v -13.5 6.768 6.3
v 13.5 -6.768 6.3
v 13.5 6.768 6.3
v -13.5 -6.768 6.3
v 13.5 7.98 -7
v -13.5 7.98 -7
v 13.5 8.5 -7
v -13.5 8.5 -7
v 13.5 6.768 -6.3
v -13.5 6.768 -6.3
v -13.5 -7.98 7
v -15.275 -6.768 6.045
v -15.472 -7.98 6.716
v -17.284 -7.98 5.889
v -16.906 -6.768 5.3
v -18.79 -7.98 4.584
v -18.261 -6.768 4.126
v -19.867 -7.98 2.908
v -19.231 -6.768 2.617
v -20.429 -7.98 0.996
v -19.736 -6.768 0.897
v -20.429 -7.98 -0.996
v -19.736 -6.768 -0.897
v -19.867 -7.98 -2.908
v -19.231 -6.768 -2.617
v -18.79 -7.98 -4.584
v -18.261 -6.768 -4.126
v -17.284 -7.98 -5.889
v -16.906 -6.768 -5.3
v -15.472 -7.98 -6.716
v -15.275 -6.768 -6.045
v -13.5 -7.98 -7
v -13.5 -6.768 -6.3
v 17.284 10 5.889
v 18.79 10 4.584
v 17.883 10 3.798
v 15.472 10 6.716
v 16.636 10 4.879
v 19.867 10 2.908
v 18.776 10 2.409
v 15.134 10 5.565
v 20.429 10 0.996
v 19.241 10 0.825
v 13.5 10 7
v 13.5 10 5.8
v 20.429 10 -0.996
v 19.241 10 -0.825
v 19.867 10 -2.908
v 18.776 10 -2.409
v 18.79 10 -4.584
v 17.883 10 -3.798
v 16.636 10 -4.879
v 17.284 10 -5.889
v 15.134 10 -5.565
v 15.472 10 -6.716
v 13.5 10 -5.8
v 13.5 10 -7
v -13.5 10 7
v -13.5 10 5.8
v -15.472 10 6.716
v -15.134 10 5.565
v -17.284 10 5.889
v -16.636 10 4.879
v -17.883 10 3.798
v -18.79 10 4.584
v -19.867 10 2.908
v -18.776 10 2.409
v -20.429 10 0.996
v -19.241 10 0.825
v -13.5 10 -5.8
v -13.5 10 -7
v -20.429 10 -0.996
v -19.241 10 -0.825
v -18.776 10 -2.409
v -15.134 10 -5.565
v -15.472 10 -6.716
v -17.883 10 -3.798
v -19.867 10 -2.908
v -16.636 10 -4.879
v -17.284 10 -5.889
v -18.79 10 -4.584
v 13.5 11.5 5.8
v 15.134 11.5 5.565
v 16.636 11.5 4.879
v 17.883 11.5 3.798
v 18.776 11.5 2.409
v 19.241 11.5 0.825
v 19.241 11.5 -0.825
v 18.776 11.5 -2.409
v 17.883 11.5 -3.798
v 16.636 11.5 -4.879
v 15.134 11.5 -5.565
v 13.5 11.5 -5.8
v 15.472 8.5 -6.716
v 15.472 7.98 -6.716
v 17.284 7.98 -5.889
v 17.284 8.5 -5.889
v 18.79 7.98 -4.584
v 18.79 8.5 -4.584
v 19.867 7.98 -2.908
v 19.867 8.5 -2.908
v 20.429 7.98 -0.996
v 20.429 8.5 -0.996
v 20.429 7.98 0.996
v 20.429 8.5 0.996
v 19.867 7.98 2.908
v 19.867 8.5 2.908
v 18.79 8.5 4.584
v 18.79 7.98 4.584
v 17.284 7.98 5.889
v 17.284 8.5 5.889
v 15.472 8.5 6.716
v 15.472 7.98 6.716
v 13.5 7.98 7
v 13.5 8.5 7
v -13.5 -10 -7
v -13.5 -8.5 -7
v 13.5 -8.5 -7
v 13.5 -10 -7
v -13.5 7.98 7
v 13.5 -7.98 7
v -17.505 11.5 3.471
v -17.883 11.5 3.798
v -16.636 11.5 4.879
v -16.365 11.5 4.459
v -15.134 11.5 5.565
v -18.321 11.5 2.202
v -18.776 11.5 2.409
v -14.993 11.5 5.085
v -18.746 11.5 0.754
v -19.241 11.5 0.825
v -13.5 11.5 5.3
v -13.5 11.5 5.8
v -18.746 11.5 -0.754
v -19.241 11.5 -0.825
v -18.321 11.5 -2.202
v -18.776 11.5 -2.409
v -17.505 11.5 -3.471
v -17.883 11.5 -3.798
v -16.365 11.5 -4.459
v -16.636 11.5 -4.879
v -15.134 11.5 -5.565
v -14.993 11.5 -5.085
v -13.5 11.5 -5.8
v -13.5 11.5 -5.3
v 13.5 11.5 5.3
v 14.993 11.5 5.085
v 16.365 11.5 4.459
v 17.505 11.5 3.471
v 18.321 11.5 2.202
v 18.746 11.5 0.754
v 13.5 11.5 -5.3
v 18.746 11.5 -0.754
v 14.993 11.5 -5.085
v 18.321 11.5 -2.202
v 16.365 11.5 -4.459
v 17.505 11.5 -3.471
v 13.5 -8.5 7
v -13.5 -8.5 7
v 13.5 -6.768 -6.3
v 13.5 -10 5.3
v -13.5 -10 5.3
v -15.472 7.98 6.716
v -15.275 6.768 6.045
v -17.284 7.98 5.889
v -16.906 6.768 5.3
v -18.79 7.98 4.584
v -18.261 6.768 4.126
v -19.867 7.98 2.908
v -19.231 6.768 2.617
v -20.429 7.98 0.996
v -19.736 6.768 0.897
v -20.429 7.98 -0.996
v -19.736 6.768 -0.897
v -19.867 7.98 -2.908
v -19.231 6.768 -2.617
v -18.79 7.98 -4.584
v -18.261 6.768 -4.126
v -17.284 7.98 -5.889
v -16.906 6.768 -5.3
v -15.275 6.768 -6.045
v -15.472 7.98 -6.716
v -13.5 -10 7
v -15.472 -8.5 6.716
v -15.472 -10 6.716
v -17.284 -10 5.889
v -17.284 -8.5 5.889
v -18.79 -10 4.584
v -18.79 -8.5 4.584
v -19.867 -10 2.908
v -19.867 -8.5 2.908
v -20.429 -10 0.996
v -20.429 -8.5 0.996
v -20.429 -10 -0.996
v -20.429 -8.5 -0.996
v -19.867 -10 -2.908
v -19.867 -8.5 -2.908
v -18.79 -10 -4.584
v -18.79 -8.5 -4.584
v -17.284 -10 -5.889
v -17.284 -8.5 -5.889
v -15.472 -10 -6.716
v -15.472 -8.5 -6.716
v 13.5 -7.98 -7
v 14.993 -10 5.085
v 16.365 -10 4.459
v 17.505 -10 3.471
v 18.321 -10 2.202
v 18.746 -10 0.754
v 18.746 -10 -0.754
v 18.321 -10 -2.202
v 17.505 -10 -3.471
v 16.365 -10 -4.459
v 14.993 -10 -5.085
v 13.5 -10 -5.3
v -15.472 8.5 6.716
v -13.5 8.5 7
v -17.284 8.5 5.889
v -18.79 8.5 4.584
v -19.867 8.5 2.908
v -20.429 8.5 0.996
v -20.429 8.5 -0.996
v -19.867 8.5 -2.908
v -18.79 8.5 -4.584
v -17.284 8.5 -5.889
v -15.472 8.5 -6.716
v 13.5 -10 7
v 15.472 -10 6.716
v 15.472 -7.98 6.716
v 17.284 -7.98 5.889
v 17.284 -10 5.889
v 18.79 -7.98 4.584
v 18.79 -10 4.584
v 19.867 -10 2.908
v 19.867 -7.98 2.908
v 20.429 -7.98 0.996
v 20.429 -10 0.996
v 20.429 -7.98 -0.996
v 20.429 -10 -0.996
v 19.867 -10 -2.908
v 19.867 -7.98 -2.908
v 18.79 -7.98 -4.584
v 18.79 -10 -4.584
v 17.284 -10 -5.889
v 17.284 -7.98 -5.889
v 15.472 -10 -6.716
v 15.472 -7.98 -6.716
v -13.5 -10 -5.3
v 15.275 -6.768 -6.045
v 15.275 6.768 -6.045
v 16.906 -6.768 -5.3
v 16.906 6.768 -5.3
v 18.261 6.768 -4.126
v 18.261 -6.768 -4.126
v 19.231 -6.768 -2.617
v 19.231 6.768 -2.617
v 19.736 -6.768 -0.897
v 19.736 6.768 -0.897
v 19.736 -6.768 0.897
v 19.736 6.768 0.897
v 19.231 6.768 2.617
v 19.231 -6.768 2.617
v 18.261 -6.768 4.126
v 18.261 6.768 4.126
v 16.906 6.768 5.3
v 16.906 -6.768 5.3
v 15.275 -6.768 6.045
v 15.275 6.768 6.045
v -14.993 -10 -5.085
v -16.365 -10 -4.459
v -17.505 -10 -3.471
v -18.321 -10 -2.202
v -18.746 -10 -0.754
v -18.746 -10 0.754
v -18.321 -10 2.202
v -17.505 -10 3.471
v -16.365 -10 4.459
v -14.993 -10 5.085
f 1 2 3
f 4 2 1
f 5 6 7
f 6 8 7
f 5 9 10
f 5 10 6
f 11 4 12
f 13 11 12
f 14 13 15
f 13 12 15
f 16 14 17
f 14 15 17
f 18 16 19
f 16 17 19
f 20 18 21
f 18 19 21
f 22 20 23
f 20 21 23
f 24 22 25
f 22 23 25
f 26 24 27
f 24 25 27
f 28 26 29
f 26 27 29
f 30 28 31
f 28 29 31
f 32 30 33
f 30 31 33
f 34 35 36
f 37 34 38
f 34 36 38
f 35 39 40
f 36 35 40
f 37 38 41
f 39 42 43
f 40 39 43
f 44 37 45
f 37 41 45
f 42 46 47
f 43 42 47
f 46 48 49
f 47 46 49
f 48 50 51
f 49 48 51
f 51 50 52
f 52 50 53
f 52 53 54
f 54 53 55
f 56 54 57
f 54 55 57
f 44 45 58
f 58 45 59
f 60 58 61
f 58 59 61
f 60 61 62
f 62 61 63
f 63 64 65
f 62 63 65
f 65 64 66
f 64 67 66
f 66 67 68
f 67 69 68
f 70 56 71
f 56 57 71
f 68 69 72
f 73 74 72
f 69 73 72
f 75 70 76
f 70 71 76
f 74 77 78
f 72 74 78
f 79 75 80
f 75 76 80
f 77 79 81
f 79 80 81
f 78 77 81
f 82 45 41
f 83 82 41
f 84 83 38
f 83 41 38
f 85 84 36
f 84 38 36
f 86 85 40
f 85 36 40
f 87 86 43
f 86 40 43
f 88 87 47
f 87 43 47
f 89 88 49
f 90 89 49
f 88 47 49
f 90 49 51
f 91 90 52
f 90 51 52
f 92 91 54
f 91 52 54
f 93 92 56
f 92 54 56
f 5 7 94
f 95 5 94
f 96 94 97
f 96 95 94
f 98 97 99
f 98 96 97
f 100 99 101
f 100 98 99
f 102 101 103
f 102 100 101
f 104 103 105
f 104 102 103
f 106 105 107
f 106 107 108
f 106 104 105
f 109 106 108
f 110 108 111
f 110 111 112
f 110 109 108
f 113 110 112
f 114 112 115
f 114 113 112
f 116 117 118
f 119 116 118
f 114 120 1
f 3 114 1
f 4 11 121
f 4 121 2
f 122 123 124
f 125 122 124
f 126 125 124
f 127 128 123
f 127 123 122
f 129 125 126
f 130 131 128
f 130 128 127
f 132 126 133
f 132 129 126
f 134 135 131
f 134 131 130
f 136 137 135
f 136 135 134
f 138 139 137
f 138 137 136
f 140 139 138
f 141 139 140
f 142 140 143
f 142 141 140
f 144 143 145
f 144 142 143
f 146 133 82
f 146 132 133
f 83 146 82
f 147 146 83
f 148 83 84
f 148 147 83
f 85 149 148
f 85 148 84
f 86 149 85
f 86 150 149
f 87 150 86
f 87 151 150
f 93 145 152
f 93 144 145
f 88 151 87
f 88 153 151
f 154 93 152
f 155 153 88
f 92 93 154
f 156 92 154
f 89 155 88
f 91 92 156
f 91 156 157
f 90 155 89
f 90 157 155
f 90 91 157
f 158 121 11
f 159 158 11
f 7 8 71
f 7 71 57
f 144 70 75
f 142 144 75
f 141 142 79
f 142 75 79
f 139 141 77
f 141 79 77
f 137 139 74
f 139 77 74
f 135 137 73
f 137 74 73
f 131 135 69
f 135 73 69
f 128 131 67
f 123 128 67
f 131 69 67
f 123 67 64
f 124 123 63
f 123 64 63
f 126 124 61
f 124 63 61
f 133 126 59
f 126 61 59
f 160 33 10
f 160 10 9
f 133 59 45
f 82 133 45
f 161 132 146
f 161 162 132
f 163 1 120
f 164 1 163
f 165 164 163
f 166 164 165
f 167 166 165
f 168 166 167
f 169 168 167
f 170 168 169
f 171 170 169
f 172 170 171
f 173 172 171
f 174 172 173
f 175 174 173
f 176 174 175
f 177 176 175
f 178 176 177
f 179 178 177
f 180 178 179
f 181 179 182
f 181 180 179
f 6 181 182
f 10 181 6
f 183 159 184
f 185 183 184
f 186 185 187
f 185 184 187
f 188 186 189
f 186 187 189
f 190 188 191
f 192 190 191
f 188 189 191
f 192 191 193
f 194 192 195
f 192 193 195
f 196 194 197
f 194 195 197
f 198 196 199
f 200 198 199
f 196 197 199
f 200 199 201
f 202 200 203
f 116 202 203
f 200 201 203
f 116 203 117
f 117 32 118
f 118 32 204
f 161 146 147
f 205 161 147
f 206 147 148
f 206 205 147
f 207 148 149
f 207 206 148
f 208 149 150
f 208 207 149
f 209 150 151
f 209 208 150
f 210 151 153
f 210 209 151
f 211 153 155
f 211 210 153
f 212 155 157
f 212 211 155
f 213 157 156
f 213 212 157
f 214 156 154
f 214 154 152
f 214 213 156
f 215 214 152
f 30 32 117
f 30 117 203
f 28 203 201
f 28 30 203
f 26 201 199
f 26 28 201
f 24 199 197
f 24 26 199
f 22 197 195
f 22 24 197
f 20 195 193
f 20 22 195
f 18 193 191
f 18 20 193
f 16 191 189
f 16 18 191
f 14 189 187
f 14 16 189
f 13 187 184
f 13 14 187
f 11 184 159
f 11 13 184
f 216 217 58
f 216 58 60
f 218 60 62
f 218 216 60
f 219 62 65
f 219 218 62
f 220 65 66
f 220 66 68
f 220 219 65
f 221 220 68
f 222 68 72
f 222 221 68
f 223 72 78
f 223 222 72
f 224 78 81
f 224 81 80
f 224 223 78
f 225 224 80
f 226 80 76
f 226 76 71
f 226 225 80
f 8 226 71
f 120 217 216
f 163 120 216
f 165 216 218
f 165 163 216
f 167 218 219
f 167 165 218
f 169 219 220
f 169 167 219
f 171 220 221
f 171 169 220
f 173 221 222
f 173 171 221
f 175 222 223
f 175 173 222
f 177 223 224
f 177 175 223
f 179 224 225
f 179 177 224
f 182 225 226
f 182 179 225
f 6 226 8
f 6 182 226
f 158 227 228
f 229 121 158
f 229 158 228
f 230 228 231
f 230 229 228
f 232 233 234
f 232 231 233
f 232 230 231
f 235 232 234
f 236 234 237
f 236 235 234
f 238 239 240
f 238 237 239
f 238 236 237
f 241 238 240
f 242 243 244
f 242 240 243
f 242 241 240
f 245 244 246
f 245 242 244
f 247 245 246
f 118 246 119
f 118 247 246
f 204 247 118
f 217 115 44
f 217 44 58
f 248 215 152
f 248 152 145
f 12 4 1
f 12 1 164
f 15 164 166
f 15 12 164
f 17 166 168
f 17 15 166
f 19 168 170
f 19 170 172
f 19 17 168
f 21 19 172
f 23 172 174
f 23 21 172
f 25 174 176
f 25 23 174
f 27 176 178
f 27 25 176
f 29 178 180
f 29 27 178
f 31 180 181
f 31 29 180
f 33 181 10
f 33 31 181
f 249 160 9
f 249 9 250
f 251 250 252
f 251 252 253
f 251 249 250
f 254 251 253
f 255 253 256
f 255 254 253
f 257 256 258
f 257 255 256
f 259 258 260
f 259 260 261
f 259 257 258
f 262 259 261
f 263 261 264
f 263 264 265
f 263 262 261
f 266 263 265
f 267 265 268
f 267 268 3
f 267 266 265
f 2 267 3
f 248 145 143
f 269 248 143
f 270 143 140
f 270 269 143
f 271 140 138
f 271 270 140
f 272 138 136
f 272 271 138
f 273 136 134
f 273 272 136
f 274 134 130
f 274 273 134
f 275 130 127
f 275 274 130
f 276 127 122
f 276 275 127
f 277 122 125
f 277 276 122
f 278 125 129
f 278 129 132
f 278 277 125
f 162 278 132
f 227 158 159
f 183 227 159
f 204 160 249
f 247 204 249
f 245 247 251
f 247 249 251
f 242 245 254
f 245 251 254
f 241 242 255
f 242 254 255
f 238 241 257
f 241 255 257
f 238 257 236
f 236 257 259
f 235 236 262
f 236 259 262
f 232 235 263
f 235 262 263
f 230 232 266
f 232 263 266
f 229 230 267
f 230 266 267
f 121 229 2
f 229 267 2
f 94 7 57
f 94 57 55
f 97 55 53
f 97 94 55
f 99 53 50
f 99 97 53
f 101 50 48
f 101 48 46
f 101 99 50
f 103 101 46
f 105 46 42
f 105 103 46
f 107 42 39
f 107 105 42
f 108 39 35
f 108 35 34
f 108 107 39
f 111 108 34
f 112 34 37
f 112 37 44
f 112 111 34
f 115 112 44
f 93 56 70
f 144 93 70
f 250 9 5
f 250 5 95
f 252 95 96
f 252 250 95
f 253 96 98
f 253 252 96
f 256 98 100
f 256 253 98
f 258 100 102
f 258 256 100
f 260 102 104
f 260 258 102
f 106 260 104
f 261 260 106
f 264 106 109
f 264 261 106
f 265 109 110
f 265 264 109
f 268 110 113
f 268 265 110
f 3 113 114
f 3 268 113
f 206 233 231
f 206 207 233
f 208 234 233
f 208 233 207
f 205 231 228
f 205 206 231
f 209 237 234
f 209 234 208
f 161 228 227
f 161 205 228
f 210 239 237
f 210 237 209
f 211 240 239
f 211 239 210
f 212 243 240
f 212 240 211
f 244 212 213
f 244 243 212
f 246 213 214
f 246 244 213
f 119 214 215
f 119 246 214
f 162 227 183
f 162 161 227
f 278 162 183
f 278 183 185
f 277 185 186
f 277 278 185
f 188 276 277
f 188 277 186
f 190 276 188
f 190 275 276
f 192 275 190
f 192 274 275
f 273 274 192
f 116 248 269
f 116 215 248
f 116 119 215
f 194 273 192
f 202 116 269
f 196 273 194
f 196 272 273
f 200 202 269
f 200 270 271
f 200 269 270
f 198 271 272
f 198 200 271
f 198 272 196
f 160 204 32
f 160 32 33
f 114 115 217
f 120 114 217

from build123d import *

# Parameters (mm, degrees)
BOSS_EXTRUDE1_DEPTH      = 10
BOSS_EXTRUDE1_DEPTH_BACK = 10
BOSS_EXTRUDE2_START      = -1.5
BOSS_EXTRUDE2_DEPTH      = 1.5
BOSS_EXTRUDE3_DEPTH      = 1.5
CHAMFER1_SIZE            = 1
CHAMFER1_SIZE_2          = 1.732050808


with BuildPart() as part:
    # Sketch1 → Boss-Extrude1 (new, two sides: drawn at the far end of the back side and taken through both)
    with BuildSketch(Plane(origin=(0, 0, 0), x_dir=(1, 0, 0), z_dir=(0, 1, 0)).offset(-BOSS_EXTRUDE1_DEPTH_BACK)):
        with BuildLine():
            Line((-13.5, 6.3), (13.5, 6.3))
            ThreePointArc((13.5, 6.3), (19.8, 0), (13.5, -6.3))
            Line((13.5, -6.3), (-13.5, -6.3))
            ThreePointArc((-13.5, -6.3), (-19.8, 0), (-13.5, 6.3))
        make_face()
        with BuildLine():
            Line((-13.5, 5.3), (13.5, 5.3))
            ThreePointArc((13.5, 5.3), (18.8, 0), (13.5, -5.3))
            Line((13.5, -5.3), (-13.5, -5.3))
            ThreePointArc((-13.5, -5.3), (-18.8, 0), (-13.5, 5.3))
        make_face(mode=Mode.SUBTRACT)
    extrude(amount=BOSS_EXTRUDE1_DEPTH + BOSS_EXTRUDE1_DEPTH_BACK)

    # Sketch2 → Boss-Extrude2 (add)
    with BuildSketch(Plane(origin=(0, 10, 0), x_dir=(1, 0, 0), z_dir=(0, 1, 0)).offset(BOSS_EXTRUDE2_START)):
        with BuildLine():
            Line((13.5, -7), (-13.5, -7))
            ThreePointArc((-13.5, -7), (-20.5, 0), (-13.5, 7))
            Line((-13.5, 7), (13.5, 7))
            ThreePointArc((13.5, 7), (20.5, 0), (13.5, -7))
        make_face()
        with BuildLine():
            Line((-13.5, -5.3), (13.5, -5.3))
            ThreePointArc((13.5, -5.3), (18.8, 0), (13.5, 5.3))
            Line((13.5, 5.3), (-13.5, 5.3))
            ThreePointArc((-13.5, 5.3), (-18.8, 0), (-13.5, -5.3))
        make_face(mode=Mode.SUBTRACT)
    boss_extrude2 = extrude(amount=BOSS_EXTRUDE2_DEPTH)

    # Mirror1: Boss-Extrude2 across plane
    add(boss_extrude2.mirror(Plane.ZX))

    # Sketch3 → Boss-Extrude3 (add)
    with BuildSketch(Plane(origin=(0, 10, 0), x_dir=(1, 0, 0), z_dir=(0, 1, 0))):
        with BuildLine():
            Line((-13.5, -5.8), (13.5, -5.8))
            ThreePointArc((13.5, -5.8), (19.3, 0), (13.5, 5.8))
            Line((13.5, 5.8), (-13.5, 5.8))
            ThreePointArc((-13.5, 5.8), (-19.3, 0), (-13.5, -5.8))
        make_face()
        with BuildLine():
            Line((-13.5, -5.3), (13.5, -5.3))
            ThreePointArc((13.5, -5.3), (18.8, 0), (13.5, 5.3))
            Line((13.5, 5.3), (-13.5, 5.3))
            ThreePointArc((-13.5, 5.3), (-18.8, 0), (-13.5, -5.3))
        make_face(mode=Mode.SUBTRACT)
    extrude(amount=BOSS_EXTRUDE3_DEPTH)

    # Chamfer1
    # the kernel refuses this chamfer: 1.732050808, 1 mm, written as the material it adds along each edge
    with BuildSketch(Plane(origin=(13.5, -8.5, 0), x_dir=(0, 0, -1), z_dir=(-1, 0, 0))) as chamfer1_piece_1_section:
        Polygon((6.3 + CHAMFER1_SIZE, 0), (6.3, -CHAMFER1_SIZE_2), (6.3, 0), align=None)
    chamfer1_piece_1 = revolve(axis=Axis((13.5, -8.5, 0), (0, -1, 0)), revolution_arc=180, mode=Mode.PRIVATE)
    chamfer1_piece_1 = chamfer1_piece_1 & Plane(origin=(13.5, -7.628425911, 0), x_dir=(0, 0, -1), z_dir=(0, 1, 0)) * Cylinder(7, 30, mode=Mode.PRIVATE)
    add(chamfer1_piece_1)
    with BuildSketch(Plane(origin=(13.5, -8.5, -6.3), x_dir=(0, -0.05789386240267147, -0.9983227437537926), z_dir=(-1, 0, 0))) as chamfer1_piece_2_section:
        Polygon((CHAMFER1_SIZE * 0.998322743754, -CHAMFER1_SIZE * 0.0578938624027), (-CHAMFER1_SIZE_2 * 0.0578938623883, -CHAMFER1_SIZE_2 * 0.998322743505), (0, 0), align=None)
    chamfer1_piece_2 = extrude(amount=27, mode=Mode.PRIVATE)
    chamfer1_piece_2 = split(chamfer1_piece_2, bisect_by=Plane(origin=(1.75e-07, -7.878612067, -7), z_dir=(0, 0, 1)), keep=Keep.TOP, mode=Mode.PRIVATE)
    add(chamfer1_piece_2)
    with BuildSketch(Plane(origin=(-13.5, -8.5, 6.3), x_dir=(0, -0.05789386240267147, 0.9983227437537926), z_dir=(1, 0, 0))) as chamfer1_piece_3_section:
        Polygon((CHAMFER1_SIZE * 0.998322743754, -CHAMFER1_SIZE * 0.0578938624027), (-CHAMFER1_SIZE_2 * 0.0578938623883, -CHAMFER1_SIZE_2 * 0.998322743505), (0, 0), align=None)
    chamfer1_piece_3 = extrude(amount=27, mode=Mode.PRIVATE)
    chamfer1_piece_3 = split(chamfer1_piece_3, bisect_by=Plane(origin=(-1.75e-07, -7.878612067, 7), z_dir=(0, 0, -1)), keep=Keep.TOP, mode=Mode.PRIVATE)
    add(chamfer1_piece_3)
    with BuildSketch(Plane(origin=(-13.5, -8.5, 0), x_dir=(0, 0, 1), z_dir=(1, 0, 0))) as chamfer1_piece_4_section:
        Polygon((6.3 + CHAMFER1_SIZE, 0), (6.3, -CHAMFER1_SIZE_2), (6.3, 0), align=None)
    chamfer1_piece_4 = revolve(axis=Axis((-13.5, -8.5, 0), (0, -1, 0)), revolution_arc=180, mode=Mode.PRIVATE)
    chamfer1_piece_4 = chamfer1_piece_4 & Plane(origin=(-13.5, -7.628425911, 0), x_dir=(0, 0, 1), z_dir=(0, 1, 0)) * Cylinder(7, 30, mode=Mode.PRIVATE)
    add(chamfer1_piece_4)
    with BuildSketch(Plane(origin=(13.5, 8.5, -6.3), x_dir=(0, -0.9998132206222079, 0.01932676561270069), z_dir=(-1, 0, 0))) as chamfer1_piece_5_section:
        Polygon((CHAMFER1_SIZE_2 * 0.999813220373, -CHAMFER1_SIZE_2 * 0.0193267656079), (-CHAMFER1_SIZE * 0.0193267656127, -CHAMFER1_SIZE * 0.999813220622), (0, 0), align=None)
    chamfer1_piece_5 = extrude(amount=27, mode=Mode.PRIVATE)
    chamfer1_piece_5 = split(chamfer1_piece_5, bisect_by=Plane(origin=(12.241463367, 7.814472043, -7), z_dir=(0, 0, 1)), keep=Keep.TOP, mode=Mode.PRIVATE)
    add(chamfer1_piece_5)
    with BuildSketch(Plane(origin=(13.5, 8.5, 0), x_dir=(0, 0, -1), z_dir=(-1, 0, 0))) as chamfer1_piece_6_section:
        Polygon((6.3 + CHAMFER1_SIZE, 0), (6.3, CHAMFER1_SIZE_2), (6.3, 0), align=None)
    chamfer1_piece_6 = revolve(axis=Axis((13.5, 8.5, 0), (0, -1, 0)), revolution_arc=180, mode=Mode.PRIVATE)
    chamfer1_piece_6 = chamfer1_piece_6 & Plane(origin=(13.5, 7.628425911, 0), x_dir=(0, 0, -1), z_dir=(0, -1, 0)) * Cylinder(7, 30, mode=Mode.PRIVATE)
    add(chamfer1_piece_6)
    with BuildSketch(Plane(origin=(-13.5, 8.5, 0), x_dir=(0, 0, 1), z_dir=(1, 0, 0))) as chamfer1_piece_7_section:
        Polygon((6.3 + CHAMFER1_SIZE, 0), (6.3, CHAMFER1_SIZE_2), (6.3, 0), align=None)
    chamfer1_piece_7 = revolve(axis=Axis((-13.5, 8.5, 0), (0, -1, 0)), revolution_arc=180, mode=Mode.PRIVATE)
    chamfer1_piece_7 = chamfer1_piece_7 & Plane(origin=(-13.5, 7.628425911, 0), x_dir=(0, 0, 1), z_dir=(0, -1, 0)) * Cylinder(7, 30, mode=Mode.PRIVATE)
    add(chamfer1_piece_7)
    with BuildSketch(Plane(origin=(-13.5, 8.5, 6.3), x_dir=(0, 0.05789386240267147, 0.9983227437537926), z_dir=(1, 0, 0))) as chamfer1_piece_8_section:
        Polygon((CHAMFER1_SIZE * 0.998322743754, CHAMFER1_SIZE * 0.0578938624027), (-CHAMFER1_SIZE_2 * 0.0578938623883, CHAMFER1_SIZE_2 * 0.998322743505), (0, 0), align=None)
    chamfer1_piece_8 = extrude(amount=27, mode=Mode.PRIVATE)
    chamfer1_piece_8 = split(chamfer1_piece_8, bisect_by=Plane(origin=(-1.75e-07, 7.878612067, 7), z_dir=(0, 0, -1)), keep=Keep.TOP, mode=Mode.PRIVATE)
    add(chamfer1_piece_8)


solid = part.part
